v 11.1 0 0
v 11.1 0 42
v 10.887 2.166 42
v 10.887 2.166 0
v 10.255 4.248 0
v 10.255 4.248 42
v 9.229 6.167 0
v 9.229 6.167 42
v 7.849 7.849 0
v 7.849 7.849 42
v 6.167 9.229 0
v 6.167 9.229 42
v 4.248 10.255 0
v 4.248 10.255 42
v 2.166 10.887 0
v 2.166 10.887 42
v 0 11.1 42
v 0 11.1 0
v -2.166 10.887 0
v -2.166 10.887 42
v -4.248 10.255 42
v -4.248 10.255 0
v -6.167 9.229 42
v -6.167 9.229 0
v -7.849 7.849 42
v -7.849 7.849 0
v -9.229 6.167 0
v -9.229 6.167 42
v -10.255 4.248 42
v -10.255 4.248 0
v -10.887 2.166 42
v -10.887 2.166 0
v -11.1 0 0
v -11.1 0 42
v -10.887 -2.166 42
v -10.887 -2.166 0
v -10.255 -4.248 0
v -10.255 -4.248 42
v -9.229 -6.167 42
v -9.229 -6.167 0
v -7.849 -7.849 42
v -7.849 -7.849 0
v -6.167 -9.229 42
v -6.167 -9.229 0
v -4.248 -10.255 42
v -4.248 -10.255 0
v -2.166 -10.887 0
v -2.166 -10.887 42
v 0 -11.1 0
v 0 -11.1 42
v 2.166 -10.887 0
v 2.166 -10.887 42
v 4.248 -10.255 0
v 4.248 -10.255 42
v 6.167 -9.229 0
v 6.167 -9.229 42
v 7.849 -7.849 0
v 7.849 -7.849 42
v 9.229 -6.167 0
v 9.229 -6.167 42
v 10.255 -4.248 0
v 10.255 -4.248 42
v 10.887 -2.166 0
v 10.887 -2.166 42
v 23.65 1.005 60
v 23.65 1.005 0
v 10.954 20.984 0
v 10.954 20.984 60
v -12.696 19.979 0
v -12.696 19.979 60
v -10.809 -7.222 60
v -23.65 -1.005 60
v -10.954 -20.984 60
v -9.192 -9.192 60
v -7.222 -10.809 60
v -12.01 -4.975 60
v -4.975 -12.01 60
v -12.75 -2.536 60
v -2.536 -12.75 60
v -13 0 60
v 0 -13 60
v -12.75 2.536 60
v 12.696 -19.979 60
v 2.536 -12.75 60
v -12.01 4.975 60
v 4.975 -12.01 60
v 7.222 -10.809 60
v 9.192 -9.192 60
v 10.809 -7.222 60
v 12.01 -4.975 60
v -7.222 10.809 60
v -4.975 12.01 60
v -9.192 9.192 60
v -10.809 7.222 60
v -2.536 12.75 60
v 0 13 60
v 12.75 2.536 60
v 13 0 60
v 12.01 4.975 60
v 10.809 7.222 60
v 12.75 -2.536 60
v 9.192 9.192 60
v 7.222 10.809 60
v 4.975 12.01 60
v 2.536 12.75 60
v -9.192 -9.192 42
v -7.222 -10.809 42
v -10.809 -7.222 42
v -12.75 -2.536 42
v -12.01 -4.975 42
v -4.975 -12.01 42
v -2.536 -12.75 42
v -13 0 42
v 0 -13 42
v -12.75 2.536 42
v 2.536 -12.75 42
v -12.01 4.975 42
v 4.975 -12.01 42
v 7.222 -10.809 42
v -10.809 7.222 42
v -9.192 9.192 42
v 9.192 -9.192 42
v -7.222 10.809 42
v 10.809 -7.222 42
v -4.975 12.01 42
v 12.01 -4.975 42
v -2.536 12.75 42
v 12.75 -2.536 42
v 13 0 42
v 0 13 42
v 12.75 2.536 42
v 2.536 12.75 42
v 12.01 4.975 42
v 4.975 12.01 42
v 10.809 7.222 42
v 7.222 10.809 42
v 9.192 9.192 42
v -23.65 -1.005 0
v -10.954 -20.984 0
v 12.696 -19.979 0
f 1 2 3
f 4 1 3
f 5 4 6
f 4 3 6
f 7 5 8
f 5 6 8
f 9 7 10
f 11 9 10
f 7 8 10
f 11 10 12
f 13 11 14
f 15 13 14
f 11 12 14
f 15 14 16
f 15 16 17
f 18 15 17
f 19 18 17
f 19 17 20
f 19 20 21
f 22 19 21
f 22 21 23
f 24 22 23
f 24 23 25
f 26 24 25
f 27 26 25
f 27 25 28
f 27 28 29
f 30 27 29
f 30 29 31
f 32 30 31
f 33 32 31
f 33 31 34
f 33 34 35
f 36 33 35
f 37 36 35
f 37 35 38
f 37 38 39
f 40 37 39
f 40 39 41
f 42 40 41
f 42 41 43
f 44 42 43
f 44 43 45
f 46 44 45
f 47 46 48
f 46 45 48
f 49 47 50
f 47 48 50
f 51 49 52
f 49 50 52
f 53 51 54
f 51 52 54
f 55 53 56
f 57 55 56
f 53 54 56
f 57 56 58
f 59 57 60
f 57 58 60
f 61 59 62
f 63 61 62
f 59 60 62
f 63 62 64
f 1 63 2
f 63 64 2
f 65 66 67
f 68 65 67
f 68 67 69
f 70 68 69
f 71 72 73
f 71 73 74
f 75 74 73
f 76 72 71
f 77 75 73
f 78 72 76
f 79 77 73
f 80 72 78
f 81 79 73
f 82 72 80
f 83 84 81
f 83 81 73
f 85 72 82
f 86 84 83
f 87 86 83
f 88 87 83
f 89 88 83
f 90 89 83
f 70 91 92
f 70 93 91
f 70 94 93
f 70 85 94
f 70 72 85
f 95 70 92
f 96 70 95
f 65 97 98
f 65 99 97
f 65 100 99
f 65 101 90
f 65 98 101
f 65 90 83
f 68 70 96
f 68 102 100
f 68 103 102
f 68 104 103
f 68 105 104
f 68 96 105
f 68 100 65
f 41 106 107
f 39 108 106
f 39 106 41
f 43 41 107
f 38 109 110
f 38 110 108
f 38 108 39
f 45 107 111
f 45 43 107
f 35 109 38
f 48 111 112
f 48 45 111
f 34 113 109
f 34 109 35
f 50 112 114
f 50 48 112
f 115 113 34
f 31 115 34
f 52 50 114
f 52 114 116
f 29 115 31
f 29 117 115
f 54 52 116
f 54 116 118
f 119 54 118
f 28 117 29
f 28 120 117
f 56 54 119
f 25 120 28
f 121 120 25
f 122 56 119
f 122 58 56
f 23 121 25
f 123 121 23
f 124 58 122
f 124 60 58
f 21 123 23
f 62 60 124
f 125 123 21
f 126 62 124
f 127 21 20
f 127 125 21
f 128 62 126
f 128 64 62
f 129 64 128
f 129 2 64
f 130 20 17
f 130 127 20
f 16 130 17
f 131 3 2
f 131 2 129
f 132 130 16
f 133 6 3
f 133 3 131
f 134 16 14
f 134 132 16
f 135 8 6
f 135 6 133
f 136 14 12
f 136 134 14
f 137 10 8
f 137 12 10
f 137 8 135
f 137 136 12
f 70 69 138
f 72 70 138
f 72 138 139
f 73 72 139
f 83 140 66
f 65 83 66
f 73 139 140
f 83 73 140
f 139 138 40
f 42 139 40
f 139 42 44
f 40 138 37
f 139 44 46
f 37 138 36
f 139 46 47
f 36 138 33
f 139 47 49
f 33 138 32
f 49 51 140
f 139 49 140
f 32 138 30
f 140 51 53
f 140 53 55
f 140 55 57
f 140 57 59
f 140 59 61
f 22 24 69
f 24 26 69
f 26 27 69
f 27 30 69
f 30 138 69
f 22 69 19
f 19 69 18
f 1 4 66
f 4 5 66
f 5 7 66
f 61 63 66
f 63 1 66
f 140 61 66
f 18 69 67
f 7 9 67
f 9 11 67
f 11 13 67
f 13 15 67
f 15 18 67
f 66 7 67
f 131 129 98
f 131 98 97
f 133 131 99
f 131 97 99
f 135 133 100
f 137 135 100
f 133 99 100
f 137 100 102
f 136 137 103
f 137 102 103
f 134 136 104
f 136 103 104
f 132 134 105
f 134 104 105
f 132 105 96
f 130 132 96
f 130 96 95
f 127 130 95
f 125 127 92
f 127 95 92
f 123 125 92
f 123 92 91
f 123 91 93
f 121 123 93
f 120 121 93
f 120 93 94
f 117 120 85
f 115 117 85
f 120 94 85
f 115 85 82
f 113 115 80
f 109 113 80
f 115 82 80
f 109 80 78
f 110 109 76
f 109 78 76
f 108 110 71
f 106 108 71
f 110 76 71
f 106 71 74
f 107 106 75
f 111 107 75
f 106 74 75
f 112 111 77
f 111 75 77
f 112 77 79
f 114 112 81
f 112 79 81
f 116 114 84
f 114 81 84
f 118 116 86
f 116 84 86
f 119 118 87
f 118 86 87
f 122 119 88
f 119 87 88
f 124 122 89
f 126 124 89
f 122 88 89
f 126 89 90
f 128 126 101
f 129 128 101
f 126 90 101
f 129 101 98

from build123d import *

# Parameters (mm, degrees)
EXTRUDE_1_DEPTH     = 60
SKETCH_2_R          = 13
CUT_EXTRUDE_1_DEPTH = 18
SKETCH_3_R          = 11.1
CUT_EXTRUDE_2_DEPTH = 53.570516706


with BuildPart() as part:
    # 草图1 → 凸台-拉伸1 (new body)
    with BuildSketch(Plane.XY):
        Polygon((-12.695703738, 19.978799762), (-23.65, -1.005402075), (-10.954296262, -20.984201837), (12.695703738, -19.978799762), (23.65, 1.005402075), (10.954296262, 20.984201837), align=None)
    extrude(amount=EXTRUDE_1_DEPTH)

    # 草图2 → 切除-拉伸1 (cut)
    with BuildSketch(Plane.XY.offset(60)):
        Circle(SKETCH_2_R)
    extrude(amount=-CUT_EXTRUDE_1_DEPTH, mode=Mode.SUBTRACT)

    # 草图3 → 切除-拉伸2 (cut, through all)
    with BuildSketch(Plane.XY.offset(42)):
        Circle(SKETCH_3_R)
    extrude(amount=-CUT_EXTRUDE_2_DEPTH, mode=Mode.SUBTRACT)


solid = part.part
